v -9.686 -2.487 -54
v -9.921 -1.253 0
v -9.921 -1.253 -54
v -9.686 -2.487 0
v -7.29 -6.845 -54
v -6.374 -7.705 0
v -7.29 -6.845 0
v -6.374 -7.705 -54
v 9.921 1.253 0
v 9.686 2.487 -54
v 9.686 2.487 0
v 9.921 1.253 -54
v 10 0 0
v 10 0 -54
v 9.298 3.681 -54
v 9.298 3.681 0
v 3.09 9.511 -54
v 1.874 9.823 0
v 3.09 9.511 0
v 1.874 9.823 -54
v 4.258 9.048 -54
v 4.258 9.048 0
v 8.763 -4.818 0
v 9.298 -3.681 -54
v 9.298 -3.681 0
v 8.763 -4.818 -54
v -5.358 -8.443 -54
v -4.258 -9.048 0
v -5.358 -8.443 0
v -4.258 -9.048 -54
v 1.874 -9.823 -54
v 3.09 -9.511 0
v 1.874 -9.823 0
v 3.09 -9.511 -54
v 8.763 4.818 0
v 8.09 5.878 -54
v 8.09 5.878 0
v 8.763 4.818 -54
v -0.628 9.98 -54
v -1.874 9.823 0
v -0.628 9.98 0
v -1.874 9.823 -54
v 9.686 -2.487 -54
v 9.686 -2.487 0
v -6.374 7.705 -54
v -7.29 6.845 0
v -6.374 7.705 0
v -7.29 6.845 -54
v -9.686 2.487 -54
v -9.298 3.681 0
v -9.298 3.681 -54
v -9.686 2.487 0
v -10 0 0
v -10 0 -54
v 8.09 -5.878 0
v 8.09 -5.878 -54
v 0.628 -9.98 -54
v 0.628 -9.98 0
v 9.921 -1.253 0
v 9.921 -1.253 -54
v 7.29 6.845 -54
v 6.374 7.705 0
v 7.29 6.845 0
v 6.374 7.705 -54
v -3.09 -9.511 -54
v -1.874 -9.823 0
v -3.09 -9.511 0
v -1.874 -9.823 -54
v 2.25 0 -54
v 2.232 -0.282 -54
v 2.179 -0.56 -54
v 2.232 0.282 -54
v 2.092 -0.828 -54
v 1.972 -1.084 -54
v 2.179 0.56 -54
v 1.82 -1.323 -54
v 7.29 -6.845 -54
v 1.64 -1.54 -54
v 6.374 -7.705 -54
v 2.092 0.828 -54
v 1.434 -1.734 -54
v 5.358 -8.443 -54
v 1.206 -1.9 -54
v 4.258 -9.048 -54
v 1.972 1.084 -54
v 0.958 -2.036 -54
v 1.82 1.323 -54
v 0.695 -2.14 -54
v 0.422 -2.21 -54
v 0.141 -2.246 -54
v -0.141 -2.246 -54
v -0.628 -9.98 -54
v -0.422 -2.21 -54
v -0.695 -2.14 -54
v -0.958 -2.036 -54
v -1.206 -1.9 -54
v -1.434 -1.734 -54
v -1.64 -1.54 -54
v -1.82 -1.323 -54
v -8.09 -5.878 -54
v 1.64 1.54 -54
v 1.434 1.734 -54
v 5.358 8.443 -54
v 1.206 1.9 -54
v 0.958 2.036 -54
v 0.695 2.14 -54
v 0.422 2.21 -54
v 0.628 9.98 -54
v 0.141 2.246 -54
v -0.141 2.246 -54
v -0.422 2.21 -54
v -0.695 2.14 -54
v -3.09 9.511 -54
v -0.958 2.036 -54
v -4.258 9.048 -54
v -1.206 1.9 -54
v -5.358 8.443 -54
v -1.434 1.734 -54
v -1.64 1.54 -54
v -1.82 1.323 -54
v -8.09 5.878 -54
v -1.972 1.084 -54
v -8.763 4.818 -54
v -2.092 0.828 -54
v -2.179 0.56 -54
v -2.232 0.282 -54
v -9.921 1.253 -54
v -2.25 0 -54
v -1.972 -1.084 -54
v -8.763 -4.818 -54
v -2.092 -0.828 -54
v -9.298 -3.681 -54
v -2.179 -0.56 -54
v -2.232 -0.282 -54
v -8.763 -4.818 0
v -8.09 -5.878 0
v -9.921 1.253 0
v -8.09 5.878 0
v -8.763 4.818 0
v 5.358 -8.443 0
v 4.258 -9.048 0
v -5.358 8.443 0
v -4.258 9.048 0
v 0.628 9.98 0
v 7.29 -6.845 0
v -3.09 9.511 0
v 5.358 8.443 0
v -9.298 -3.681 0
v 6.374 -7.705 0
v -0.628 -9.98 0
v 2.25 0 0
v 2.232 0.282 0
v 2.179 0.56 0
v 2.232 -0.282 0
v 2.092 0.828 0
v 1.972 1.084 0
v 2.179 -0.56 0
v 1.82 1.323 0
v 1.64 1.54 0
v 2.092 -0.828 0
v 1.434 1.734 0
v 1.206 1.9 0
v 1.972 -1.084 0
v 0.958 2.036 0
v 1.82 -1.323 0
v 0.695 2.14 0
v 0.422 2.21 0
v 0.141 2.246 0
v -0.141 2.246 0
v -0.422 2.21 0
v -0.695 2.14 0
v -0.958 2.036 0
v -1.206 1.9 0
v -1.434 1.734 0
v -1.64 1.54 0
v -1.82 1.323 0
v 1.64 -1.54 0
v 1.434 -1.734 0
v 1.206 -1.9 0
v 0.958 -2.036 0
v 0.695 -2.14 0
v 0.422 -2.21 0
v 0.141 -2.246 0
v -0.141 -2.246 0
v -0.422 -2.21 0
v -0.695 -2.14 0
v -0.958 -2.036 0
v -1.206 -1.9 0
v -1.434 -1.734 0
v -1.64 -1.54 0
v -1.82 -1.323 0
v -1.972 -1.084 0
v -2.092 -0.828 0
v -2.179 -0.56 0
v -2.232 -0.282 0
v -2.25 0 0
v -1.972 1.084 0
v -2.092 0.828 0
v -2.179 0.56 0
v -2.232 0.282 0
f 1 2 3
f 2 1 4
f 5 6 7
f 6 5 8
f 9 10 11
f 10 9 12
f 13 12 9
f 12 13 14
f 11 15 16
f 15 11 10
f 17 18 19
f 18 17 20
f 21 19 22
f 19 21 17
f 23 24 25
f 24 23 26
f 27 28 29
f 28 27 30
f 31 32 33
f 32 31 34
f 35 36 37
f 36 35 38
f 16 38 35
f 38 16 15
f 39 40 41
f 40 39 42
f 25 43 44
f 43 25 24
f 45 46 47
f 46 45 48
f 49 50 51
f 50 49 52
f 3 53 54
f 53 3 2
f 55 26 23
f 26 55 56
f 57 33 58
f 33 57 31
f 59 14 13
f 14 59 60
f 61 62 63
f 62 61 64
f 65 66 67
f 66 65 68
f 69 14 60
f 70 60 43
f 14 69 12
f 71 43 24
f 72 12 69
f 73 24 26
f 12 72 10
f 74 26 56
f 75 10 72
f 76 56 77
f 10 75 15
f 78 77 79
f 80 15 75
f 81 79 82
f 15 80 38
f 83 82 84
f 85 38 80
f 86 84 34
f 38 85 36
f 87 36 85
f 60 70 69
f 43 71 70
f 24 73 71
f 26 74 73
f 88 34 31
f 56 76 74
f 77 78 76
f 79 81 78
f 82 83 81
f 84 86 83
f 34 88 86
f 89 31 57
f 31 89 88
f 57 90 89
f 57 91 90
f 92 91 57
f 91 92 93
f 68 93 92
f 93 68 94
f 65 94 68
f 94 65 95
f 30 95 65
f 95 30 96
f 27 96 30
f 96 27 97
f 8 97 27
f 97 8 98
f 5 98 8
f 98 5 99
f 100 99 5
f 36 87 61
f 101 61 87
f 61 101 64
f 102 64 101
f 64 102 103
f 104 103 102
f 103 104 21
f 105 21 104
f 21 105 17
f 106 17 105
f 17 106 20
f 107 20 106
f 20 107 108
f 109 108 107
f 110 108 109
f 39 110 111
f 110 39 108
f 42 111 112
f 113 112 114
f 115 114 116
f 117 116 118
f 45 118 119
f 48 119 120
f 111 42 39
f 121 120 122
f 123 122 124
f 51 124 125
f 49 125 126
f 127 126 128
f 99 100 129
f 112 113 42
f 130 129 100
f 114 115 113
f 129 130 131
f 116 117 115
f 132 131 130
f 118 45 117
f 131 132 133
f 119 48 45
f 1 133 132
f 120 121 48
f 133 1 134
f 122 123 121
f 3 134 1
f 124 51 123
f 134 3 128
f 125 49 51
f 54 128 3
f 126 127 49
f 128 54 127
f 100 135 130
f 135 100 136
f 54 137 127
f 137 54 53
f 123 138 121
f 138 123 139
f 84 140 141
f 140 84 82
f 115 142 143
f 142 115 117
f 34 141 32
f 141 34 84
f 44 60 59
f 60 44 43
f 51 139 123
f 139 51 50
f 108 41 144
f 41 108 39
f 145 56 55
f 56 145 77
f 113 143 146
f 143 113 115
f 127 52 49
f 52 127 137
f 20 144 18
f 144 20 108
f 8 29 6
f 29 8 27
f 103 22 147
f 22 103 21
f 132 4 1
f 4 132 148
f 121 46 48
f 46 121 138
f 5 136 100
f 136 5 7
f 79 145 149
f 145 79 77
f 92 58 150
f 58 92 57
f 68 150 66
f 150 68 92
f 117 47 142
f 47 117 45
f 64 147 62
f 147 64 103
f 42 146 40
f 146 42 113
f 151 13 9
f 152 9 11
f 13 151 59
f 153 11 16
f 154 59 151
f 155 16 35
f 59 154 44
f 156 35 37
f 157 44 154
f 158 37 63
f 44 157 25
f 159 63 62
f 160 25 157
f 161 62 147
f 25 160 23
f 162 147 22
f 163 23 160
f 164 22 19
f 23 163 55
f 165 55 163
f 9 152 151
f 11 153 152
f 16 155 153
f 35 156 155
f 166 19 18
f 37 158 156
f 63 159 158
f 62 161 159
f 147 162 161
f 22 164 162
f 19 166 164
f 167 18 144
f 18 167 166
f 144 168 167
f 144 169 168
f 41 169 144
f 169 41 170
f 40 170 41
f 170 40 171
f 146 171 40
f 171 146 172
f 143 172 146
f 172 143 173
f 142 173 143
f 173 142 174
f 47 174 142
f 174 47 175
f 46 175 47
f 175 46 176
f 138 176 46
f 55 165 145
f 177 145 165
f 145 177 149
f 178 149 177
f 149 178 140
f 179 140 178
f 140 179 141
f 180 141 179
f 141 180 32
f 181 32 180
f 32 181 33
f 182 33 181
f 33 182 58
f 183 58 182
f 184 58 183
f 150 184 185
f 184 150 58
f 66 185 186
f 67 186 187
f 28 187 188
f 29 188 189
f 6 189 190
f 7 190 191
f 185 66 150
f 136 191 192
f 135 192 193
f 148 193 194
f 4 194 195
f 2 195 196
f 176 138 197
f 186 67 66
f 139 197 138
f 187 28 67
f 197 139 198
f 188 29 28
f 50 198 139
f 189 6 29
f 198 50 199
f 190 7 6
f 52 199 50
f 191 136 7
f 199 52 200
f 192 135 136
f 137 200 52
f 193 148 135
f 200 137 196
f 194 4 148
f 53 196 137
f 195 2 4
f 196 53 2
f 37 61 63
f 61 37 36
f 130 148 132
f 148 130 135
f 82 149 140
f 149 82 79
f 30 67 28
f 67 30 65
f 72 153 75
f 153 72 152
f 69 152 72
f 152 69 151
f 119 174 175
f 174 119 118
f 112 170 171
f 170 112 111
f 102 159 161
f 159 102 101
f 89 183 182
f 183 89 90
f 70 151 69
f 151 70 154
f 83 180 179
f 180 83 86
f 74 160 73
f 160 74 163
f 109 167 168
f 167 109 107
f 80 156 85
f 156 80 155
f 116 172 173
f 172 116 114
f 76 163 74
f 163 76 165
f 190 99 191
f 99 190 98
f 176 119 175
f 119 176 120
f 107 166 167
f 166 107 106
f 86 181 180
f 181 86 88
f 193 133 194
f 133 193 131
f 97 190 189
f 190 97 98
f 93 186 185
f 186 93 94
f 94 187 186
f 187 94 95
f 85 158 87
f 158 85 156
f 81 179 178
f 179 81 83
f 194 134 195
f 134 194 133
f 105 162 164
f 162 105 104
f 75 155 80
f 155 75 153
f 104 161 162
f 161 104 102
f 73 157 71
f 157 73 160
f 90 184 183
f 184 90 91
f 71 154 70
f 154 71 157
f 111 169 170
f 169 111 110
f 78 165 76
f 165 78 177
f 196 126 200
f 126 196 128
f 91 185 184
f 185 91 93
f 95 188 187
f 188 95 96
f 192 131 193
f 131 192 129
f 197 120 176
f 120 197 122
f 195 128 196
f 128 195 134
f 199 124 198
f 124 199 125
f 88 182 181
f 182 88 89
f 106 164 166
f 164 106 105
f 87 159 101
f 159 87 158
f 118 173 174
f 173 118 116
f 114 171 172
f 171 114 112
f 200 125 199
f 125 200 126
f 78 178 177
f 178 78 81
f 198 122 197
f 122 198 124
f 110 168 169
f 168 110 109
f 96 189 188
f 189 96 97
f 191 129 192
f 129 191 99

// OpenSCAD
$fn = 50;


difference() {
	union() {
		translate(v = [0, 0, -54.0000000000]) {
			cylinder(h = 54, r = 10.0000000000);
		}
	}
	union() {
		#translate(v = [0, 0, -54]) {
			cylinder(h = 54, r = 2.2500000000);
		}
	}
}
